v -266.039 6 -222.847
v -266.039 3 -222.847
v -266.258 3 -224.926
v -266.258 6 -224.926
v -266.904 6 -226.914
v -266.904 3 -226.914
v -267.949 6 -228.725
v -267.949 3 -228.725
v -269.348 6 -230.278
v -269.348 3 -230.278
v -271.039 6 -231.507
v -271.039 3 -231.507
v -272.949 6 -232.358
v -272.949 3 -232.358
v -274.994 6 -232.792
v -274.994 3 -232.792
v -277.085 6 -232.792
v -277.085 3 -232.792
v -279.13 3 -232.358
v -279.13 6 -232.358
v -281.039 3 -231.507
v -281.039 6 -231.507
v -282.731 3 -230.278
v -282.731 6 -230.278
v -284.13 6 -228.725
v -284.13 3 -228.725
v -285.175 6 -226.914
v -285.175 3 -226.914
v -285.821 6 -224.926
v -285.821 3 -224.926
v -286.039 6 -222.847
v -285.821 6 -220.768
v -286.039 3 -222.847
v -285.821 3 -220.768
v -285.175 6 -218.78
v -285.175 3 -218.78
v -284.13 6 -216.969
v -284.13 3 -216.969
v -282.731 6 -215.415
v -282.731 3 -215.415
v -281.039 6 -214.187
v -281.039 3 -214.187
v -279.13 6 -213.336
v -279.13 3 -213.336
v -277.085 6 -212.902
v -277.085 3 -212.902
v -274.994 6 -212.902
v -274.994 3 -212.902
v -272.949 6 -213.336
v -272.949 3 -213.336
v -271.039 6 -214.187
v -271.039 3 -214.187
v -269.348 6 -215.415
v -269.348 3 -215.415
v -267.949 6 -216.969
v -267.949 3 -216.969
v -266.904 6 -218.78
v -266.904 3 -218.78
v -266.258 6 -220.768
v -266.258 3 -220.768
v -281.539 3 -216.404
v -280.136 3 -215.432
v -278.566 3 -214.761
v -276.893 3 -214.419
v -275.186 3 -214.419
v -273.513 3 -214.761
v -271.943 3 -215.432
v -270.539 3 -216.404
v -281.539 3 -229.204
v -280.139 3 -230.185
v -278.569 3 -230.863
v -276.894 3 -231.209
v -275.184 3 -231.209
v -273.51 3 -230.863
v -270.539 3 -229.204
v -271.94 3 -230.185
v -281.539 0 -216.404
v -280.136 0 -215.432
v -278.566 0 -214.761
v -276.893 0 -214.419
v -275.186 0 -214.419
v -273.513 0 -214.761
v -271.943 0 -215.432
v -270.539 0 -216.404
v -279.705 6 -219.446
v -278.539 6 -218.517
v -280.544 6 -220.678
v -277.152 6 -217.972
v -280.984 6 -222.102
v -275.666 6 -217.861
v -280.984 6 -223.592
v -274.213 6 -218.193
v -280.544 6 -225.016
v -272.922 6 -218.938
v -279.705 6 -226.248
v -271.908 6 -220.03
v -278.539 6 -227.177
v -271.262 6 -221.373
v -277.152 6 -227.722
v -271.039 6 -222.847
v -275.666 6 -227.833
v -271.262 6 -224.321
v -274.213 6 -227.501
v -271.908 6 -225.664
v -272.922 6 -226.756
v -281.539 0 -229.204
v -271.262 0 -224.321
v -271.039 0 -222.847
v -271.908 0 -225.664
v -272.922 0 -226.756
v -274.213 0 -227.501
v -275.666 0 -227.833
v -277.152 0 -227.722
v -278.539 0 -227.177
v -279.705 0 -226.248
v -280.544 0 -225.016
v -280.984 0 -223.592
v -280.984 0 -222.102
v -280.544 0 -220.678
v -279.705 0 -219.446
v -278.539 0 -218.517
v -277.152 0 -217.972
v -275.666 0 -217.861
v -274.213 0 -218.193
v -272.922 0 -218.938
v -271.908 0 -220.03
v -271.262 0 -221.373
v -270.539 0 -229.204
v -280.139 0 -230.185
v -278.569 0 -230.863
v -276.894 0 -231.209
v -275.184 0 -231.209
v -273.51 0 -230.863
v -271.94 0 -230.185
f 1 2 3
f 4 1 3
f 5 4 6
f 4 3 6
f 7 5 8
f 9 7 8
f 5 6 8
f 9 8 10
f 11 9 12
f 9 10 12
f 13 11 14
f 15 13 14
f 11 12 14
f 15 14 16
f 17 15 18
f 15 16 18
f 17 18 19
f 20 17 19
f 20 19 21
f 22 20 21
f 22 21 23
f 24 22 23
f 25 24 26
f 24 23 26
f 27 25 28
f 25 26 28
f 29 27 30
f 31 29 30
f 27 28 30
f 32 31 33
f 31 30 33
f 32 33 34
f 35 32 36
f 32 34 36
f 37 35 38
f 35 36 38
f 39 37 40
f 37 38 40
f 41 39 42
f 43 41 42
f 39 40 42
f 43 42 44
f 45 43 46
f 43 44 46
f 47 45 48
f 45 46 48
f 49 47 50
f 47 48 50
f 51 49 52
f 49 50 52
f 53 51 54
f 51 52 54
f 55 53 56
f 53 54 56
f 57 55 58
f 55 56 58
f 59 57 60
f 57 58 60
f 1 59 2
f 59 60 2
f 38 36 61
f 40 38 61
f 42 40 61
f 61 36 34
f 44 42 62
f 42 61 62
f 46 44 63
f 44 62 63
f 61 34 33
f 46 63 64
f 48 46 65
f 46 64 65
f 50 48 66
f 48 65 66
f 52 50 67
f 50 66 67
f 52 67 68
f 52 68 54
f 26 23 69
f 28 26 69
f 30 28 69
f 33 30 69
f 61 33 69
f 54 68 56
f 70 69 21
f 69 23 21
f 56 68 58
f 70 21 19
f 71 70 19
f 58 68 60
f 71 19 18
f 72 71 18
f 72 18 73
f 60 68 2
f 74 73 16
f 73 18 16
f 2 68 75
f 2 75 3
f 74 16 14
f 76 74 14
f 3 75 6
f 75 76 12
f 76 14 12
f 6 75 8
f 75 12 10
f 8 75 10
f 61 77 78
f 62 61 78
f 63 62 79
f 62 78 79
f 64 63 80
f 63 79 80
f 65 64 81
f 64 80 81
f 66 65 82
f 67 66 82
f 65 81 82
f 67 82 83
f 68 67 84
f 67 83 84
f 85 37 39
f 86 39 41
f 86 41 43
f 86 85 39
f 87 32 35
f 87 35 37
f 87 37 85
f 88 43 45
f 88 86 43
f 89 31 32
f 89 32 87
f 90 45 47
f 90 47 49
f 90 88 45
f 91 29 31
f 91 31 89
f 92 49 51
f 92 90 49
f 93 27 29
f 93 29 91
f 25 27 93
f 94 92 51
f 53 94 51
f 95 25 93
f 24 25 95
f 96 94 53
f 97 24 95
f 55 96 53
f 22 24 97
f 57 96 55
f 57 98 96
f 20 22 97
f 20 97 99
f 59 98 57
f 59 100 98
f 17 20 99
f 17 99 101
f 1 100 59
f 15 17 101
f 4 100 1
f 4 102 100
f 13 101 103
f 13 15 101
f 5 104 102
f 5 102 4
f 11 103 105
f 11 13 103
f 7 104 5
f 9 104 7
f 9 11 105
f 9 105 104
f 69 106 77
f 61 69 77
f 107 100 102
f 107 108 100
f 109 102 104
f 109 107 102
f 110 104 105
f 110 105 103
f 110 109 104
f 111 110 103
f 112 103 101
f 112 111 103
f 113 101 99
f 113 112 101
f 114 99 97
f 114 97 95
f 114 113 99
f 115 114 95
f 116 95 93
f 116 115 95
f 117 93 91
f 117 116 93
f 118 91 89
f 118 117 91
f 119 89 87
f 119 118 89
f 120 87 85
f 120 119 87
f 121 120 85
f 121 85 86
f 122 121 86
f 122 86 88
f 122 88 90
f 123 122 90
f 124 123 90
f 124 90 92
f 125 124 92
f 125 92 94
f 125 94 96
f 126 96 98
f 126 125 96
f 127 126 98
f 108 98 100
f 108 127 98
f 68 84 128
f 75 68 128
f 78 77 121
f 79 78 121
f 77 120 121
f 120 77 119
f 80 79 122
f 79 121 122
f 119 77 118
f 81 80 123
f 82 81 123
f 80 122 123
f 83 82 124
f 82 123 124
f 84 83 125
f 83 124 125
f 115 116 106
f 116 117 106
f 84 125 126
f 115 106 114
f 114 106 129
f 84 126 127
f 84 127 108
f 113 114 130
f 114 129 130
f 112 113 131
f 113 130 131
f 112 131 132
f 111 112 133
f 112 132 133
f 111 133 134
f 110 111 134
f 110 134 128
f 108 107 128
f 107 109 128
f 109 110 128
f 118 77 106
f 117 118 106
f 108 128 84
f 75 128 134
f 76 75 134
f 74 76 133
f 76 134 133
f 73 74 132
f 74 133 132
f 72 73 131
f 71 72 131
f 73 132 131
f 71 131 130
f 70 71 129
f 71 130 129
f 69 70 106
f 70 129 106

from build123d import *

# Parameters (mm, degrees)
SKETCH1_R           = 5
BOSS_EXTRUDE1_DEPTH = 3
SKETCH2_R           = 10
SKETCH2_R_2         = 5
BOSS_EXTRUDE2_DEPTH = 3


with BuildPart() as part:
    # Sketch1 → Boss-Extrude1 (new body)
    with BuildSketch(Plane(origin=(0, 0, 0), x_dir=(1, 0, 0), z_dir=(0, 1, 0))):
        with BuildLine():
            Line((-281.53939526, 229.203780512), (-281.53939526, 216.403780512))
            ThreePointArc((-281.53939526, 216.403780512), (-276.03939526, 214.375557893), (-270.53939526, 216.403780512))
            Line((-270.53939526, 216.403780512), (-270.53939526, 229.203780512))
            ThreePointArc((-270.53939526, 229.203780512), (-276.03939526, 231.252855213), (-281.53939526, 229.203780512))
        make_face()
        with Locations((-276.03939526, 222.846937384)):
            Circle(SKETCH1_R, mode=Mode.SUBTRACT)
    extrude(amount=BOSS_EXTRUDE1_DEPTH)

    # Sketch2 → Boss-Extrude2 (add)
    with BuildSketch(Plane(origin=(0, 3, 0), x_dir=(1, 0, 0), z_dir=(0, 1, 0))):
        with Locations((-276.03939526, 222.846937384)):
            Circle(SKETCH2_R)
        with Locations((-276.03939526, 222.846937384)):
            Circle(SKETCH2_R_2, mode=Mode.SUBTRACT)
    extrude(amount=BOSS_EXTRUDE2_DEPTH)


solid = part.part
